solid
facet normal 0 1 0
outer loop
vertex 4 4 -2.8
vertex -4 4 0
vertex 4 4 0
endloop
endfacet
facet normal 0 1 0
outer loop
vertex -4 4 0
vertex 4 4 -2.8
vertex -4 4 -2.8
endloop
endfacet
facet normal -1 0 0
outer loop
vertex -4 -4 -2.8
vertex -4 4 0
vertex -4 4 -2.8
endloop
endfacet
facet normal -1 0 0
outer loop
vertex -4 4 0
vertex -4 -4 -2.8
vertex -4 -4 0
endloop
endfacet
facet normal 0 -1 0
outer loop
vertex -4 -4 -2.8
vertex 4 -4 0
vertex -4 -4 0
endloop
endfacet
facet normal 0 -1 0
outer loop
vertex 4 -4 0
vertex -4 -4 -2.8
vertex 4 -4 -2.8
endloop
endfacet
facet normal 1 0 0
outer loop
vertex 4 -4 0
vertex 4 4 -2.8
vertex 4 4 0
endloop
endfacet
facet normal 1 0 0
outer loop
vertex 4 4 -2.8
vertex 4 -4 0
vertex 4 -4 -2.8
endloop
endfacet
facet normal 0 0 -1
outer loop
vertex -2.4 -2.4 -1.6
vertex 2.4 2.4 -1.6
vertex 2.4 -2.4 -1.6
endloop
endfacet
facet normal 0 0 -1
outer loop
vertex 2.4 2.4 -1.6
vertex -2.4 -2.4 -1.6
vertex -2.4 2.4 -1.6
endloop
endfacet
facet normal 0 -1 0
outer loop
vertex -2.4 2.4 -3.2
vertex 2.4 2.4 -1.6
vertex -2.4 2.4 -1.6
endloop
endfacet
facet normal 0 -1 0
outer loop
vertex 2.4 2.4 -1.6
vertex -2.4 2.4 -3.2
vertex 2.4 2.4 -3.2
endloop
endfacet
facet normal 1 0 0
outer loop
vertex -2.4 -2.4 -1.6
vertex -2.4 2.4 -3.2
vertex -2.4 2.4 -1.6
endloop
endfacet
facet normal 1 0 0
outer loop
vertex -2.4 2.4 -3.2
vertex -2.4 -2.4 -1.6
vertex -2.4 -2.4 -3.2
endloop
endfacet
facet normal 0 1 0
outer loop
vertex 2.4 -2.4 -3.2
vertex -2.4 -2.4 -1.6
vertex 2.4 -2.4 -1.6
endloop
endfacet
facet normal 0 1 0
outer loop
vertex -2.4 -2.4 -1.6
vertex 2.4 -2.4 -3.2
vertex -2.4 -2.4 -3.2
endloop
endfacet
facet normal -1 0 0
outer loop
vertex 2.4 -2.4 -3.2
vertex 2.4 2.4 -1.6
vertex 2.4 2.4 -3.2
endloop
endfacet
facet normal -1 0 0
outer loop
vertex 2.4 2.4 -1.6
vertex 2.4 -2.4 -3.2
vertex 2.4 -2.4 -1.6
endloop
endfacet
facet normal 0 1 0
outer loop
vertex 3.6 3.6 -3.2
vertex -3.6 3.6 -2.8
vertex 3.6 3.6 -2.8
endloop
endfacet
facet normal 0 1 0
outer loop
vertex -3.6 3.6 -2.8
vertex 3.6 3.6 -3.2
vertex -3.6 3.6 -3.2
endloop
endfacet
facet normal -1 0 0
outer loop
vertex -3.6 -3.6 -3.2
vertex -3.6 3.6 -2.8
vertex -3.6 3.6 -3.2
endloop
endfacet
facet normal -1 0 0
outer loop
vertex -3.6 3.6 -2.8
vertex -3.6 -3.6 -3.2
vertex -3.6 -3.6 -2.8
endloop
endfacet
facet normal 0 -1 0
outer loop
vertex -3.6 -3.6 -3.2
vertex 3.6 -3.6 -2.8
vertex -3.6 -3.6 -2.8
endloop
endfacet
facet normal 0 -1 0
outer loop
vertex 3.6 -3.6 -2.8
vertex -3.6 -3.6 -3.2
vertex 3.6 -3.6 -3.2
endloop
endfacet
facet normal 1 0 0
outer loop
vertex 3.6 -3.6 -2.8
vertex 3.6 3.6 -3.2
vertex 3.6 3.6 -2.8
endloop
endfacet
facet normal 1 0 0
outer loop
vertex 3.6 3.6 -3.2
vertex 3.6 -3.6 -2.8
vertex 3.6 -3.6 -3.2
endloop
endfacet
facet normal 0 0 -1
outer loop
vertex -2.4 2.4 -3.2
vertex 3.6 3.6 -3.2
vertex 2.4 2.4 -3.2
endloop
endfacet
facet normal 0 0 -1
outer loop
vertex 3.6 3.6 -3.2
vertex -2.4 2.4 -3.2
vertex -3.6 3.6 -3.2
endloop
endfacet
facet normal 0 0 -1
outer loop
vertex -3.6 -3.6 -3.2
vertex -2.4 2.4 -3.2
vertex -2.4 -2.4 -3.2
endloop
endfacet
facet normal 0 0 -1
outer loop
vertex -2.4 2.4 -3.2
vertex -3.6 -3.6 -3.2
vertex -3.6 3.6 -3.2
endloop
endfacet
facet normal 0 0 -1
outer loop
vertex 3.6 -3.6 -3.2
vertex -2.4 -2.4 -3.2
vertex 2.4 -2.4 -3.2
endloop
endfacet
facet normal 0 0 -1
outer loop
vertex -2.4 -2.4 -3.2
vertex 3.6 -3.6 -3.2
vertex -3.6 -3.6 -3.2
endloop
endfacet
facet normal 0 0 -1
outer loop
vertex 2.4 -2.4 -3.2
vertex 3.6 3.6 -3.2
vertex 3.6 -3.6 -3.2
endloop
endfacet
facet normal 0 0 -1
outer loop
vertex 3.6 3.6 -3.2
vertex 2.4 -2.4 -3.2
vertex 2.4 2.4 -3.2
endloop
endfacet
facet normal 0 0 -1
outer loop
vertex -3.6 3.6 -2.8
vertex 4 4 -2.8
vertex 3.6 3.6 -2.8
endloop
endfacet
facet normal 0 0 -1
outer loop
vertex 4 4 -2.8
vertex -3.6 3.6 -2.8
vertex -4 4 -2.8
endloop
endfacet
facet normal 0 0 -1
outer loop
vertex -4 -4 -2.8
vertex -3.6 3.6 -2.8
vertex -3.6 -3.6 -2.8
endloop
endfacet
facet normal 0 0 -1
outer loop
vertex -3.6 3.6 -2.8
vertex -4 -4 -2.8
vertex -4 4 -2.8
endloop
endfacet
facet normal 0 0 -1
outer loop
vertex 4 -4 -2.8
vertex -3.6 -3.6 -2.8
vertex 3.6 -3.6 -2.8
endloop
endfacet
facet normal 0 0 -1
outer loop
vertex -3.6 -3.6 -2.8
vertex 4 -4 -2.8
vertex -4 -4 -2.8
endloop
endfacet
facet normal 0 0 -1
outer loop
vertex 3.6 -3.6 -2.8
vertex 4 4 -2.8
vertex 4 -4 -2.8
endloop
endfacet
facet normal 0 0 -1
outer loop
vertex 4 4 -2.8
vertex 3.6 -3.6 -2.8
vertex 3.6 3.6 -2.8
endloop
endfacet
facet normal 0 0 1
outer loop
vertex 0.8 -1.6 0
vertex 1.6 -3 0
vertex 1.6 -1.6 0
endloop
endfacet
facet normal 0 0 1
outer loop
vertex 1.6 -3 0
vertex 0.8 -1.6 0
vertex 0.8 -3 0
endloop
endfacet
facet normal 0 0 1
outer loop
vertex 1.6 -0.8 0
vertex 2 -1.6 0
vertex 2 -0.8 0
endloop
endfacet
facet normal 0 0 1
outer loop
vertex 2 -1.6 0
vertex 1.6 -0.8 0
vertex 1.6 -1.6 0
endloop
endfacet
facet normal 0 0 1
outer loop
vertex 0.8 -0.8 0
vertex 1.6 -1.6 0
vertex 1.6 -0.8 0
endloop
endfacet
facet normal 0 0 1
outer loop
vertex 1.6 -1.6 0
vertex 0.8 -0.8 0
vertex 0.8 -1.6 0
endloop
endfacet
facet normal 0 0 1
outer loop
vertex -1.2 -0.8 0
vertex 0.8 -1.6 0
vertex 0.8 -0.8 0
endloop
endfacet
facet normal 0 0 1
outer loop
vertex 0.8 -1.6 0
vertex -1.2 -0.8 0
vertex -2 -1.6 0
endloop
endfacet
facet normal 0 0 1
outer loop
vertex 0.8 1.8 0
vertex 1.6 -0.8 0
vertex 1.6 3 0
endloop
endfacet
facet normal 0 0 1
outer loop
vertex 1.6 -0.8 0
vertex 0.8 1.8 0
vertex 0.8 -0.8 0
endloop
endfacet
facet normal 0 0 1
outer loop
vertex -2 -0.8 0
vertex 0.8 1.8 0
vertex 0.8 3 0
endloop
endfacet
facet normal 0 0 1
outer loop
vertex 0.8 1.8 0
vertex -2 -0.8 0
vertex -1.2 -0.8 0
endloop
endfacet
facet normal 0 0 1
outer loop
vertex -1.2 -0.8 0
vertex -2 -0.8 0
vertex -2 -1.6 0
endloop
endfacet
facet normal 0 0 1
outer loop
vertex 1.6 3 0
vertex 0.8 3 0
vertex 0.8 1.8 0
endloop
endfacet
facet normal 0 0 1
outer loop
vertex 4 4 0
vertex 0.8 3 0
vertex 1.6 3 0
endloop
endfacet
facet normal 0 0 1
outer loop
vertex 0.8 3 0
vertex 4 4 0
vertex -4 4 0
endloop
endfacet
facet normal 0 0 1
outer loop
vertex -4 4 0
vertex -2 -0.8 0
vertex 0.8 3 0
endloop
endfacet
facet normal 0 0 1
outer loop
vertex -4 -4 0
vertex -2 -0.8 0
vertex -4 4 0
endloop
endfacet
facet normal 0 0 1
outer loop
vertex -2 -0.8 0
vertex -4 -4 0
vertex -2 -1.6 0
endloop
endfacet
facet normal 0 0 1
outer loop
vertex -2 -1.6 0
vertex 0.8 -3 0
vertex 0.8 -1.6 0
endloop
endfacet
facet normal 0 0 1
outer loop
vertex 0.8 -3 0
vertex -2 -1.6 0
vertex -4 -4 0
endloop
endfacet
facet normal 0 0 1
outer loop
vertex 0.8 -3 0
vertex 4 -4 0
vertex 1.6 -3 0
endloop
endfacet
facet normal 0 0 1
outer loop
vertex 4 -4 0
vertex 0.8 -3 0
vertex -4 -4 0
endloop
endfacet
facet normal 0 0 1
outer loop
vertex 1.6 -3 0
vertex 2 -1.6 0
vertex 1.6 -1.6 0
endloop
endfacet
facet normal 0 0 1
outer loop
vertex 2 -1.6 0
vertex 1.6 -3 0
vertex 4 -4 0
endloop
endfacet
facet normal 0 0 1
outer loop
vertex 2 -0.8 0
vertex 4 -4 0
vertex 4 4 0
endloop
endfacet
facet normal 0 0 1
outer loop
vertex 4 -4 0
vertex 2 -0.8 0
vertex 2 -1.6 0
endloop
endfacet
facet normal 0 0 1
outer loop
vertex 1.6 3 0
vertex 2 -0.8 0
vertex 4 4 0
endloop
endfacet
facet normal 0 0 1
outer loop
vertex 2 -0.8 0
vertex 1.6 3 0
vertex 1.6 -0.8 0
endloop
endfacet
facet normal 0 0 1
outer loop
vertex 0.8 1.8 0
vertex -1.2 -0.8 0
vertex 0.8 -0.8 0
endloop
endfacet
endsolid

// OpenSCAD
// file: ../p/box5.scad
use <../lib.scad>
function ldraw_lib__box5() = [
// 0 Box with 5 Faces and All Edges
// 0 Name: box5.dat
// 0 Author: James Jessiman
// 0 !LDRAW_ORG Primitive UPDATE 2012-01
// 0 !LICENSE Licensed under CC BY 4.0 : see CAreadme.txt
// 
// 0 BFC CERTIFY CCW
  [0,"BFC","CERTIFY"],
  [0,"BFC","CCW"],
// 
// 0 !HISTORY 2002-04-03 [sbliss] Modified for BFC compliance
// 0 !HISTORY 2002-04-25 [PTadmin] Official Update 2002-02
// 0 !HISTORY 2007-06-24 [PTadmin] Header formatted for Contributor Agreement
// 0 !HISTORY 2008-07-01 [PTadmin] Official Update 2008-01
// 0 !HISTORY 2012-02-16 [Philo] Changed to CCW
// 0 !HISTORY 2012-03-30 [PTadmin] Official Update 2012-01
// 
// 
// 2 24 1 1 1 -1 1 1
  [2,24,1,1,1,-1,1,1],
// 2 24 -1 1 1 -1 1 -1
  [2,24,-1,1,1,-1,1,-1],
// 2 24 -1 1 -1 1 1 -1
  [2,24,-1,1,-1,1,1,-1],
// 2 24 1 1 -1 1 1 1
  [2,24,1,1,-1,1,1,1],
// 2 24 1 0 1 -1 0 1
  [2,24,1,0,1,-1,0,1],
// 2 24 -1 0 1 -1 0 -1
  [2,24,-1,0,1,-1,0,-1],
// 2 24 -1 0 -1 1 0 -1
  [2,24,-1,0,-1,1,0,-1],
// 2 24 1 0 -1 1 0 1
  [2,24,1,0,-1,1,0,1],
// 2 24 1 0 1 1 1 1
  [2,24,1,0,1,1,1,1],
// 2 24 -1 0 1 -1 1 1
  [2,24,-1,0,1,-1,1,1],
// 2 24 1 0 -1 1 1 -1
  [2,24,1,0,-1,1,1,-1],
// 2 24 -1 0 -1 -1 1 -1
  [2,24,-1,0,-1,-1,1,-1],
// 4 16 -1 1 1 1 1 1 1 1 -1 -1 1 -1
  [4,16,-1,1,1,1,1,1,1,1,-1,-1,1,-1],
// 4 16 -1 1 1 -1 0 1 1 0 1 1 1 1
  [4,16,-1,1,1,-1,0,1,1,0,1,1,1,1],
// 4 16 -1 1 -1 -1 0 -1 -1 0 1 -1 1 1
  [4,16,-1,1,-1,-1,0,-1,-1,0,1,-1,1,1],
// 4 16 1 1 -1 1 0 -1 -1 0 -1 -1 1 -1
  [4,16,1,1,-1,1,0,-1,-1,0,-1,-1,1,-1],
// 4 16 1 1 1 1 0 1 1 0 -1 1 1 -1
  [4,16,1,1,1,1,0,1,1,0,-1,1,1,-1],
];
module ldraw_lib__box5(step=0, col=false, unit=2/5, alt=false, line=0.2, solid=!$preview)
    makepoly(ldraw_lib__box5(), step=step, col=col, unit=unit, alt=alt, line=line, solid=solid);
ldraw_lib__box5(line=0.2);
// file: ../p/box4.scad
use <../lib.scad>
function ldraw_lib__box4() = [
// 0 Box with 4 Faces (2 Parallel Pairs) and All Edges
// 0 Name: box4.dat
// 0 Author: James Jessiman
// 0 !LDRAW_ORG Primitive UPDATE 2012-01
// 0 !LICENSE Licensed under CC BY 4.0 : see CAreadme.txt
// 
// 0 BFC CERTIFY CCW
  [0,"BFC","CERTIFY"],
  [0,"BFC","CCW"],
// 
// 0 !HISTORY 2002-04-03 [sbliss] Modified for BFC compliance
// 0 !HISTORY 2002-04-25 [PTadmin] Official Update 2002-02
// 0 !HISTORY 2007-06-24 [PTadmin] Header formatted for Contributor Agreement
// 0 !HISTORY 2008-07-01 [PTadmin] Official Update 2008-01
// 0 !HISTORY 2012-02-16 [Philo] Changed to CCW
// 0 !HISTORY 2012-03-30 [PTadmin] Official Update 2012-01
// 
// 
// 2 24 1 1 1 -1 1 1
  [2,24,1,1,1,-1,1,1],
// 2 24 -1 1 1 -1 1 -1
  [2,24,-1,1,1,-1,1,-1],
// 2 24 -1 1 -1 1 1 -1
  [2,24,-1,1,-1,1,1,-1],
// 2 24 1 1 -1 1 1 1
  [2,24,1,1,-1,1,1,1],
// 2 24 1 0 1 -1 0 1
  [2,24,1,0,1,-1,0,1],
// 2 24 -1 0 1 -1 0 -1
  [2,24,-1,0,1,-1,0,-1],
// 2 24 -1 0 -1 1 0 -1
  [2,24,-1,0,-1,1,0,-1],
// 2 24 1 0 -1 1 0 1
  [2,24,1,0,-1,1,0,1],
// 2 24 1 0 1 1 1 1
  [2,24,1,0,1,1,1,1],
// 2 24 -1 0 1 -1 1 1
  [2,24,-1,0,1,-1,1,1],
// 2 24 1 0 -1 1 1 -1
  [2,24,1,0,-1,1,1,-1],
// 2 24 -1 0 -1 -1 1 -1
  [2,24,-1,0,-1,-1,1,-1],
// 4 16 -1 1 1 -1 0 1 1 0 1 1 1 1
  [4,16,-1,1,1,-1,0,1,1,0,1,1,1,1],
// 4 16 -1 1 -1 -1 0 -1 -1 0 1 -1 1 1
  [4,16,-1,1,-1,-1,0,-1,-1,0,1,-1,1,1],
// 4 16 1 1 -1 1 0 -1 -1 0 -1 -1 1 -1
  [4,16,1,1,-1,1,0,-1,-1,0,-1,-1,1,-1],
// 4 16 1 1 1 1 0 1 1 0 -1 1 1 -1
  [4,16,1,1,1,1,0,1,1,0,-1,1,1,-1],
];
module ldraw_lib__box4(step=0, col=false, unit=2/5, alt=false, line=0.2, solid=!$preview)
    makepoly(ldraw_lib__box4(), step=step, col=col, unit=unit, alt=alt, line=line, solid=solid);
ldraw_lib__box4(line=0.2);
// file: s/3070bs01.scad
use <../../lib.scad>
use <../../p/box4.scad>
use <../../p/box5.scad>
function ldraw_lib__s__3070bs01() = [
// 0 ~Tile  1 x  1 with Groove without Top Face
// 0 Name: s\3070bs01.dat
// 0 Author: Chris Dee [cwdee]
// 0 !LDRAW_ORG Subpart UPDATE 2009-02
// 0 !LICENSE Licensed under CC BY 4.0 : see CAreadme.txt
// 
// 0 BFC CERTIFY CCW
  [0,"BFC","CERTIFY"],
  [0,"BFC","CCW"],
// 
// 0 !HISTORY 2009-09-03 [PTadmin] Official Update 2009-02
// 
// 
// 1 16 0 0 0 10 0 0 0 7 0 0 0 10 box4.dat
  [1,16,0,0,0,10,0,0,0,7,0,0,0,10, ldraw_lib__box4()],
// 0 BFC INVERTNEXT
  [0,"BFC","INVERTNEXT"],
// 1 16 0 8 0 6 0 0 0 -4 0 0 0 6 box5.dat
  [1,16,0,8,0,6,0,0,0,-4,0,0,0,6, ldraw_lib__box5()],
// 1 16 0 7 0 9 0 0 0 1 0 0 0 9 box4.dat
  [1,16,0,7,0,9,0,0,0,1,0,0,0,9, ldraw_lib__box4()],
// 
// 4 16 9 8 9 6 8 6 -6 8 6 -9 8 9
  [4,16,9,8,9,6,8,6,-6,8,6,-9,8,9],
// 4 16 -9 8 9 -6 8 6 -6 8 -6 -9 8 -9
  [4,16,-9,8,9,-6,8,6,-6,8,-6,-9,8,-9],
// 4 16 -9 8 -9 -6 8 -6 6 8 -6 9 8 -9
  [4,16,-9,8,-9,-6,8,-6,6,8,-6,9,8,-9],
// 4 16 9 8 -9 6 8 -6 6 8 6 9 8 9
  [4,16,9,8,-9,6,8,-6,6,8,6,9,8,9],
// 
// 4 16 10 7 10 9 7 9 -9 7 9 -10 7 10
  [4,16,10,7,10,9,7,9,-9,7,9,-10,7,10],
// 4 16 -10 7 10 -9 7 9 -9 7 -9 -10 7 -10
  [4,16,-10,7,10,-9,7,9,-9,7,-9,-10,7,-10],
// 4 16 -10 7 -10 -9 7 -9 9 7 -9 10 7 -10
  [4,16,-10,7,-10,-9,7,-9,9,7,-9,10,7,-10],
// 4 16 10 7 -10 9 7 -9 9 7 9 10 7 10
  [4,16,10,7,-10,9,7,-9,9,7,9,10,7,10],
// 0
];
module ldraw_lib__s__3070bs01(step=0, col=false, unit=2/5, alt=false, line=0.2, solid=!$preview)
    makepoly(ldraw_lib__s__3070bs01(), step=step, col=col, unit=unit, alt=alt, line=line, solid=solid);
ldraw_lib__s__3070bs01(line=0.2);
// main file
use <../lib.scad>
use <s/3070bs01.scad>
function ldraw_lib__3070bpv4() = [
// 0 Tile  1 x  1 with Silver "4" Pattern
// 0 Name: 3070bpv4.dat
// 0 Author: Magnus Forsberg [MagFors]
// 0 !LDRAW_ORG Part UPDATE 2015-02
// 0 !LICENSE Licensed under CC BY 4.0 : see CAreadme.txt
// 
// 0 BFC CERTIFY CCW
  [0,"BFC","CERTIFY"],
  [0,"BFC","CCW"],
// 
// 0 !KEYWORDS BrickLink 3070pb064, Rebrickable 3070bpr0092, Set 850425
// 
// 0 !HISTORY 2015-12-30 [PTadmin] Official Update 2015-02
// 
// 
// 1 16 0 0 0 1 0 0 0 1 0 0 0 1 s\3070bs01.dat
  [1,16,0,0,0,1,0,0,0,1,0,0,0,1, ldraw_lib__s__3070bs01()],
// 
// 4 80 4 0 -4 2 0 -4 2 0 -7.5 4 0 -7.5
  [4,80,4,0,-4,2,0,-4,2,0,-7.5,4,0,-7.5],
// 4 80 4 0 -2 4 0 -4 5 0 -4 5 0 -2
  [4,80,4,0,-2,4,0,-4,5,0,-4,5,0,-2],
// 4 80 2 0 -4 4 0 -4 4 0 -2 2 0 -2
  [4,80,2,0,-4,4,0,-4,4,0,-2,2,0,-2],
// 4 80 2 0 -4 2 0 -2 -3 0 -2 -5 0 -4
  [4,80,2,0,-4,2,0,-2,-3,0,-2,-5,0,-4],
// 4 80 2 0 4.5 2 0 -2 4 0 -2 4 0 7.5
  [4,80,2,0,4.5,2,0,-2,4,0,-2,4,0,7.5],
// 4 80 -3 0 -2 2 0 4.5 2 0 7.5 -5 0 -2
  [4,80,-3,0,-2,2,0,4.5,2,0,7.5,-5,0,-2],
// 3 80 -3 0 -2 -5 0 -2 -5 0 -4
  [3,80,-3,0,-2,-5,0,-2,-5,0,-4],
// 3 80 4 0 7.5 2 0 7.5 2 0 4.5
  [3,80,4,0,7.5,2,0,7.5,2,0,4.5],
// 
// 4 16 -10 0 10 2 0 7.5 4 0 7.5 10 0 10
  [4,16,-10,0,10,2,0,7.5,4,0,7.5,10,0,10],
// 3 16 -10 0 10 -5 0 -2 2 0 7.5
  [3,16,-10,0,10,-5,0,-2,2,0,7.5],
// 4 16 -10 0 -10 -5 0 -4 -5 0 -2 -10 0 10
  [4,16,-10,0,-10,-5,0,-4,-5,0,-2,-10,0,10],
// 4 16 -5 0 -4 -10 0 -10 2 0 -7.5 2 0 -4
  [4,16,-5,0,-4,-10,0,-10,2,0,-7.5,2,0,-4],
// 4 16 2 0 -7.5 -10 0 -10 10 0 -10 4 0 -7.5
  [4,16,2,0,-7.5,-10,0,-10,10,0,-10,4,0,-7.5],
// 4 16 4 0 -4 4 0 -7.5 10 0 -10 5 0 -4
  [4,16,4,0,-4,4,0,-7.5,10,0,-10,5,0,-4],
// 4 16 5 0 -2 5 0 -4 10 0 -10 10 0 10
  [4,16,5,0,-2,5,0,-4,10,0,-10,10,0,10],
// 4 16 4 0 7.5 4 0 -2 5 0 -2 10 0 10
  [4,16,4,0,7.5,4,0,-2,5,0,-2,10,0,10],
// 3 16 2 0 4.5 -3 0 -2 2 0 -2
  [3,16,2,0,4.5,-3,0,-2,2,0,-2],
];
module ldraw_lib__3070bpv4(step=0, col=false, unit=2/5, alt=false, line=0.2, solid=!$preview)
    makepoly(ldraw_lib__3070bpv4(), step=step, col=col, unit=unit, alt=alt, line=line, solid=solid);
ldraw_lib__3070bpv4(line=0.2);
